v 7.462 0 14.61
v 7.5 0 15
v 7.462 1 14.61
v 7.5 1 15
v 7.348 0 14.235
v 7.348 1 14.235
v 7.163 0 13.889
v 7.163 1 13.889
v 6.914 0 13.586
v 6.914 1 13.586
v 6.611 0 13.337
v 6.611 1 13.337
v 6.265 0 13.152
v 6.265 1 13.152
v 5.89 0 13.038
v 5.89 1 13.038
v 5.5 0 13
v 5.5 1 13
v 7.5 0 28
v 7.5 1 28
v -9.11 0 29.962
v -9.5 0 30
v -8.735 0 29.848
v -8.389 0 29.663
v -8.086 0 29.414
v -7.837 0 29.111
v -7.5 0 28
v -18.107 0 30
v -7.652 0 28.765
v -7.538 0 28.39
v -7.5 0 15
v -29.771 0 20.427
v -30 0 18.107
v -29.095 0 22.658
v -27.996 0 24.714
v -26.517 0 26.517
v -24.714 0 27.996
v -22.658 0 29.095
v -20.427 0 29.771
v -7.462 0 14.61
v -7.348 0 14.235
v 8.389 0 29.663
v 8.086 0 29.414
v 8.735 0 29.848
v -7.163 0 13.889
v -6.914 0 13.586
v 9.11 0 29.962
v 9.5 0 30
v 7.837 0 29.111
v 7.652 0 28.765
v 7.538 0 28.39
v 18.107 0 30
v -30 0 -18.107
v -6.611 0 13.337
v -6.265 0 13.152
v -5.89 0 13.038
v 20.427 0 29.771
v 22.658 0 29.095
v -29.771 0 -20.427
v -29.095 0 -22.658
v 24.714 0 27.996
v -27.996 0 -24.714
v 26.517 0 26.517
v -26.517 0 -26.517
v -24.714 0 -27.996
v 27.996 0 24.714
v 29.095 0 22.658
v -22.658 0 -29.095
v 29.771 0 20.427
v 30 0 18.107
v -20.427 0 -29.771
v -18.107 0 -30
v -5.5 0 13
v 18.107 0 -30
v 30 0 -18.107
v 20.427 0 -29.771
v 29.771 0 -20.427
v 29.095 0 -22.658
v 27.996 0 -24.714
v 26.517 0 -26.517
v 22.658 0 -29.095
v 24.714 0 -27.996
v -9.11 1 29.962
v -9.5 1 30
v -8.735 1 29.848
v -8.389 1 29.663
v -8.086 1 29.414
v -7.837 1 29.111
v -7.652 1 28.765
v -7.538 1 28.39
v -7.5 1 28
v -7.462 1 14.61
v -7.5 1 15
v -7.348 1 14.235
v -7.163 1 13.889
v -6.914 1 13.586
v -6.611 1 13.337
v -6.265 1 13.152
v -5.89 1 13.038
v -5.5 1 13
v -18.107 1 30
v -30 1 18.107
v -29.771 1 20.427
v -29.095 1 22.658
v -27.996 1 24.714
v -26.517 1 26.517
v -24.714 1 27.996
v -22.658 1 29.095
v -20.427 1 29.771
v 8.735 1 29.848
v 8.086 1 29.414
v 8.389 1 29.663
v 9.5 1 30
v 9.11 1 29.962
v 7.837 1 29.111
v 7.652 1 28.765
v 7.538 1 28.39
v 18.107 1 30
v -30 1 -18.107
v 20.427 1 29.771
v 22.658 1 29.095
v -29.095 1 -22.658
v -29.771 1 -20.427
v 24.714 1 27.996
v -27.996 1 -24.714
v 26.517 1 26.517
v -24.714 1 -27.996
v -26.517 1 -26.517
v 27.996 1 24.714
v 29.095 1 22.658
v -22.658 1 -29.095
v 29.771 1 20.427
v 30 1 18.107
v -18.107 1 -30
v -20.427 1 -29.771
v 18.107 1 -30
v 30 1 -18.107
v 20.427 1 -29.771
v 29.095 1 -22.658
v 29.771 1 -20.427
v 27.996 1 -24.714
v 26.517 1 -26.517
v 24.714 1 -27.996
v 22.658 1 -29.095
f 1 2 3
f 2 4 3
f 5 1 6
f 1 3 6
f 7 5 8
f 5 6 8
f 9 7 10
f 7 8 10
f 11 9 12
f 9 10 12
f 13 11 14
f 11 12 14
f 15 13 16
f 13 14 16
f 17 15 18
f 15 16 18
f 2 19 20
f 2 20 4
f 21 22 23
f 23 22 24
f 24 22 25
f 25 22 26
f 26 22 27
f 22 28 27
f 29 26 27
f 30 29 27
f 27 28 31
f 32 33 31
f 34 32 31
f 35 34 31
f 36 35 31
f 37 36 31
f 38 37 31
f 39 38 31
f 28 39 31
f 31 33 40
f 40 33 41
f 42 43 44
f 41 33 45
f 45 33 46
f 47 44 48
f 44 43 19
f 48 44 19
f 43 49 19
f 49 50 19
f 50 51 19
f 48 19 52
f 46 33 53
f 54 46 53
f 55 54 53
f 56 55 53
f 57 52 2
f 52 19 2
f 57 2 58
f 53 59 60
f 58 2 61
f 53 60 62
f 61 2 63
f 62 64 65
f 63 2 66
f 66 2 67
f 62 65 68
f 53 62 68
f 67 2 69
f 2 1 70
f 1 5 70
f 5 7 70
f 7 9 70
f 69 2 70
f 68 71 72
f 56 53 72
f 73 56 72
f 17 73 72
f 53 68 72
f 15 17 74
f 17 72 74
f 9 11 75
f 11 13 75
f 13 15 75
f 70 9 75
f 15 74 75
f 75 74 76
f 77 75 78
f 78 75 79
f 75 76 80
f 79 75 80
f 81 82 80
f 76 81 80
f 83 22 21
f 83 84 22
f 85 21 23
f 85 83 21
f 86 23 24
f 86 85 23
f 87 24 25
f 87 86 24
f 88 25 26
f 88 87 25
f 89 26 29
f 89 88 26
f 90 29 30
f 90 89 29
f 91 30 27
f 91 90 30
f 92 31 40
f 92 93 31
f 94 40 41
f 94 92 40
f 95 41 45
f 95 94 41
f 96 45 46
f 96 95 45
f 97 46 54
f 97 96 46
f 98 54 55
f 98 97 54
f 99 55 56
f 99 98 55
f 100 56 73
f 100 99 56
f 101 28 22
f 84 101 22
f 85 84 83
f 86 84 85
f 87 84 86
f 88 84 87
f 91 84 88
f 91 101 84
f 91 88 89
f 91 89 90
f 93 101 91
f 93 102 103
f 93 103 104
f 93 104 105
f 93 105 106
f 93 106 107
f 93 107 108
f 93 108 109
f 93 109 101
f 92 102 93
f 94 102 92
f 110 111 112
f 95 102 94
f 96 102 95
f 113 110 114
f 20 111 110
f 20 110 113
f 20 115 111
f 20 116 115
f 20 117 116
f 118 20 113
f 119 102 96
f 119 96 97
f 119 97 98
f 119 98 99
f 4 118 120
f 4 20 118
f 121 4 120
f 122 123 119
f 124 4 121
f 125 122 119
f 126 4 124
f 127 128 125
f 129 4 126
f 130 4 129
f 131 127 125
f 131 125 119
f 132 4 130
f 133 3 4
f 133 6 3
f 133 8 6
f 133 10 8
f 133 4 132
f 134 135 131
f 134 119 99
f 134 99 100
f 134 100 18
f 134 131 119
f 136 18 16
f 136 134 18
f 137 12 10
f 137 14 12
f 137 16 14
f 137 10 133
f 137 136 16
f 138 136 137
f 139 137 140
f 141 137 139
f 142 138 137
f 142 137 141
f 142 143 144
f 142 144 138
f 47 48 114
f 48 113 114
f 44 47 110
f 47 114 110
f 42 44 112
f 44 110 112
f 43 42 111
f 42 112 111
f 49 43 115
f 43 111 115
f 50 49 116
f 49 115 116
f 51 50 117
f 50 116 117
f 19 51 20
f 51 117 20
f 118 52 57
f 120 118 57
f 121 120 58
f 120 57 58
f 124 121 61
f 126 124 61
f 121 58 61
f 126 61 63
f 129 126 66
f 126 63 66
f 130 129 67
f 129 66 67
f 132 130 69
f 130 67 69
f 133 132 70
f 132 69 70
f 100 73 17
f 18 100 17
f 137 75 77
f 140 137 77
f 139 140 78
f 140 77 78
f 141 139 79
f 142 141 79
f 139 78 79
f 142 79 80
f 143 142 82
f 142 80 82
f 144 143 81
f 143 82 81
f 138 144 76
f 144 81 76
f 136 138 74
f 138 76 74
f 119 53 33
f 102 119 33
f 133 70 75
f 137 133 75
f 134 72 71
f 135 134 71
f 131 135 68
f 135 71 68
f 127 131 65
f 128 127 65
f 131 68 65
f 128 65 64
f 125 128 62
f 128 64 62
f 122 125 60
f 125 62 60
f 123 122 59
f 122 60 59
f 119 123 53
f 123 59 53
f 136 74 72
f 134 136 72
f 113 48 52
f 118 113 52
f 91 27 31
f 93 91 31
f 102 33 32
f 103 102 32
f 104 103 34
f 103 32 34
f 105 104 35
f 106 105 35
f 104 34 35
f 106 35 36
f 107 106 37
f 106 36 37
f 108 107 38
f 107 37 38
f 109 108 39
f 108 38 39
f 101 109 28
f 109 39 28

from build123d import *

# Parameters (mm, degrees)
BOSS_EXTRUDE1_DEPTH = 1
SKETCH3_W           = 15
SKETCH3_H           = 17
CUT_EXTRUDE1_DEPTH  = 1
FILLET1_R           = 2


with BuildPart() as part:
    # Sketch2 → Boss-Extrude1 (new body)
    with BuildSketch(Plane(origin=(0, 0, 0), x_dir=(1, 0, 0), z_dir=(0, 1, 0))):
        with BuildLine():
            Line((-18.106601718, -30), (18.106601718, -30))
            ThreePointArc((18.106601718, -30), (26.516504294, -26.516504294), (30, -18.106601718))
            Line((30, -18.106601718), (30, 18.106601718))
            ThreePointArc((30, 18.106601718), (26.516504294, 26.516504294), (18.106601718, 30))
            Line((18.106601718, 30), (-18.106601718, 30))
            ThreePointArc((-18.106601718, 30), (-26.516504294, 26.516504294), (-30, 18.106601718))
            Line((-30, 18.106601718), (-30, -18.106601718))
            ThreePointArc((-30, -18.106601718), (-26.516504294, -26.516504294), (-18.106601718, -30))
        make_face()
    extrude(amount=BOSS_EXTRUDE1_DEPTH)

    # Sketch3 → Cut-Extrude1 (cut)
    with BuildSketch(Plane(origin=(0, 0, 0), x_dir=(1, 0, 0), z_dir=(0, 1, 0))):
        with Locations((0, -21.5)):
            Rectangle(SKETCH3_W, SKETCH3_H)
    extrude(amount=CUT_EXTRUDE1_DEPTH, mode=Mode.SUBTRACT)

    # Fillet1
    fillet1_edges = [part.edges().sort_by_distance(p)[0] for p in [
        (-7.5, 0.5, 13),
        (-7.5, 0.5, 30),
        (7.5, 0.5, 30),
        (7.5, 0.5, 13),
    ]]
    fillet(fillet1_edges, radius=FILLET1_R)


solid = part.part
